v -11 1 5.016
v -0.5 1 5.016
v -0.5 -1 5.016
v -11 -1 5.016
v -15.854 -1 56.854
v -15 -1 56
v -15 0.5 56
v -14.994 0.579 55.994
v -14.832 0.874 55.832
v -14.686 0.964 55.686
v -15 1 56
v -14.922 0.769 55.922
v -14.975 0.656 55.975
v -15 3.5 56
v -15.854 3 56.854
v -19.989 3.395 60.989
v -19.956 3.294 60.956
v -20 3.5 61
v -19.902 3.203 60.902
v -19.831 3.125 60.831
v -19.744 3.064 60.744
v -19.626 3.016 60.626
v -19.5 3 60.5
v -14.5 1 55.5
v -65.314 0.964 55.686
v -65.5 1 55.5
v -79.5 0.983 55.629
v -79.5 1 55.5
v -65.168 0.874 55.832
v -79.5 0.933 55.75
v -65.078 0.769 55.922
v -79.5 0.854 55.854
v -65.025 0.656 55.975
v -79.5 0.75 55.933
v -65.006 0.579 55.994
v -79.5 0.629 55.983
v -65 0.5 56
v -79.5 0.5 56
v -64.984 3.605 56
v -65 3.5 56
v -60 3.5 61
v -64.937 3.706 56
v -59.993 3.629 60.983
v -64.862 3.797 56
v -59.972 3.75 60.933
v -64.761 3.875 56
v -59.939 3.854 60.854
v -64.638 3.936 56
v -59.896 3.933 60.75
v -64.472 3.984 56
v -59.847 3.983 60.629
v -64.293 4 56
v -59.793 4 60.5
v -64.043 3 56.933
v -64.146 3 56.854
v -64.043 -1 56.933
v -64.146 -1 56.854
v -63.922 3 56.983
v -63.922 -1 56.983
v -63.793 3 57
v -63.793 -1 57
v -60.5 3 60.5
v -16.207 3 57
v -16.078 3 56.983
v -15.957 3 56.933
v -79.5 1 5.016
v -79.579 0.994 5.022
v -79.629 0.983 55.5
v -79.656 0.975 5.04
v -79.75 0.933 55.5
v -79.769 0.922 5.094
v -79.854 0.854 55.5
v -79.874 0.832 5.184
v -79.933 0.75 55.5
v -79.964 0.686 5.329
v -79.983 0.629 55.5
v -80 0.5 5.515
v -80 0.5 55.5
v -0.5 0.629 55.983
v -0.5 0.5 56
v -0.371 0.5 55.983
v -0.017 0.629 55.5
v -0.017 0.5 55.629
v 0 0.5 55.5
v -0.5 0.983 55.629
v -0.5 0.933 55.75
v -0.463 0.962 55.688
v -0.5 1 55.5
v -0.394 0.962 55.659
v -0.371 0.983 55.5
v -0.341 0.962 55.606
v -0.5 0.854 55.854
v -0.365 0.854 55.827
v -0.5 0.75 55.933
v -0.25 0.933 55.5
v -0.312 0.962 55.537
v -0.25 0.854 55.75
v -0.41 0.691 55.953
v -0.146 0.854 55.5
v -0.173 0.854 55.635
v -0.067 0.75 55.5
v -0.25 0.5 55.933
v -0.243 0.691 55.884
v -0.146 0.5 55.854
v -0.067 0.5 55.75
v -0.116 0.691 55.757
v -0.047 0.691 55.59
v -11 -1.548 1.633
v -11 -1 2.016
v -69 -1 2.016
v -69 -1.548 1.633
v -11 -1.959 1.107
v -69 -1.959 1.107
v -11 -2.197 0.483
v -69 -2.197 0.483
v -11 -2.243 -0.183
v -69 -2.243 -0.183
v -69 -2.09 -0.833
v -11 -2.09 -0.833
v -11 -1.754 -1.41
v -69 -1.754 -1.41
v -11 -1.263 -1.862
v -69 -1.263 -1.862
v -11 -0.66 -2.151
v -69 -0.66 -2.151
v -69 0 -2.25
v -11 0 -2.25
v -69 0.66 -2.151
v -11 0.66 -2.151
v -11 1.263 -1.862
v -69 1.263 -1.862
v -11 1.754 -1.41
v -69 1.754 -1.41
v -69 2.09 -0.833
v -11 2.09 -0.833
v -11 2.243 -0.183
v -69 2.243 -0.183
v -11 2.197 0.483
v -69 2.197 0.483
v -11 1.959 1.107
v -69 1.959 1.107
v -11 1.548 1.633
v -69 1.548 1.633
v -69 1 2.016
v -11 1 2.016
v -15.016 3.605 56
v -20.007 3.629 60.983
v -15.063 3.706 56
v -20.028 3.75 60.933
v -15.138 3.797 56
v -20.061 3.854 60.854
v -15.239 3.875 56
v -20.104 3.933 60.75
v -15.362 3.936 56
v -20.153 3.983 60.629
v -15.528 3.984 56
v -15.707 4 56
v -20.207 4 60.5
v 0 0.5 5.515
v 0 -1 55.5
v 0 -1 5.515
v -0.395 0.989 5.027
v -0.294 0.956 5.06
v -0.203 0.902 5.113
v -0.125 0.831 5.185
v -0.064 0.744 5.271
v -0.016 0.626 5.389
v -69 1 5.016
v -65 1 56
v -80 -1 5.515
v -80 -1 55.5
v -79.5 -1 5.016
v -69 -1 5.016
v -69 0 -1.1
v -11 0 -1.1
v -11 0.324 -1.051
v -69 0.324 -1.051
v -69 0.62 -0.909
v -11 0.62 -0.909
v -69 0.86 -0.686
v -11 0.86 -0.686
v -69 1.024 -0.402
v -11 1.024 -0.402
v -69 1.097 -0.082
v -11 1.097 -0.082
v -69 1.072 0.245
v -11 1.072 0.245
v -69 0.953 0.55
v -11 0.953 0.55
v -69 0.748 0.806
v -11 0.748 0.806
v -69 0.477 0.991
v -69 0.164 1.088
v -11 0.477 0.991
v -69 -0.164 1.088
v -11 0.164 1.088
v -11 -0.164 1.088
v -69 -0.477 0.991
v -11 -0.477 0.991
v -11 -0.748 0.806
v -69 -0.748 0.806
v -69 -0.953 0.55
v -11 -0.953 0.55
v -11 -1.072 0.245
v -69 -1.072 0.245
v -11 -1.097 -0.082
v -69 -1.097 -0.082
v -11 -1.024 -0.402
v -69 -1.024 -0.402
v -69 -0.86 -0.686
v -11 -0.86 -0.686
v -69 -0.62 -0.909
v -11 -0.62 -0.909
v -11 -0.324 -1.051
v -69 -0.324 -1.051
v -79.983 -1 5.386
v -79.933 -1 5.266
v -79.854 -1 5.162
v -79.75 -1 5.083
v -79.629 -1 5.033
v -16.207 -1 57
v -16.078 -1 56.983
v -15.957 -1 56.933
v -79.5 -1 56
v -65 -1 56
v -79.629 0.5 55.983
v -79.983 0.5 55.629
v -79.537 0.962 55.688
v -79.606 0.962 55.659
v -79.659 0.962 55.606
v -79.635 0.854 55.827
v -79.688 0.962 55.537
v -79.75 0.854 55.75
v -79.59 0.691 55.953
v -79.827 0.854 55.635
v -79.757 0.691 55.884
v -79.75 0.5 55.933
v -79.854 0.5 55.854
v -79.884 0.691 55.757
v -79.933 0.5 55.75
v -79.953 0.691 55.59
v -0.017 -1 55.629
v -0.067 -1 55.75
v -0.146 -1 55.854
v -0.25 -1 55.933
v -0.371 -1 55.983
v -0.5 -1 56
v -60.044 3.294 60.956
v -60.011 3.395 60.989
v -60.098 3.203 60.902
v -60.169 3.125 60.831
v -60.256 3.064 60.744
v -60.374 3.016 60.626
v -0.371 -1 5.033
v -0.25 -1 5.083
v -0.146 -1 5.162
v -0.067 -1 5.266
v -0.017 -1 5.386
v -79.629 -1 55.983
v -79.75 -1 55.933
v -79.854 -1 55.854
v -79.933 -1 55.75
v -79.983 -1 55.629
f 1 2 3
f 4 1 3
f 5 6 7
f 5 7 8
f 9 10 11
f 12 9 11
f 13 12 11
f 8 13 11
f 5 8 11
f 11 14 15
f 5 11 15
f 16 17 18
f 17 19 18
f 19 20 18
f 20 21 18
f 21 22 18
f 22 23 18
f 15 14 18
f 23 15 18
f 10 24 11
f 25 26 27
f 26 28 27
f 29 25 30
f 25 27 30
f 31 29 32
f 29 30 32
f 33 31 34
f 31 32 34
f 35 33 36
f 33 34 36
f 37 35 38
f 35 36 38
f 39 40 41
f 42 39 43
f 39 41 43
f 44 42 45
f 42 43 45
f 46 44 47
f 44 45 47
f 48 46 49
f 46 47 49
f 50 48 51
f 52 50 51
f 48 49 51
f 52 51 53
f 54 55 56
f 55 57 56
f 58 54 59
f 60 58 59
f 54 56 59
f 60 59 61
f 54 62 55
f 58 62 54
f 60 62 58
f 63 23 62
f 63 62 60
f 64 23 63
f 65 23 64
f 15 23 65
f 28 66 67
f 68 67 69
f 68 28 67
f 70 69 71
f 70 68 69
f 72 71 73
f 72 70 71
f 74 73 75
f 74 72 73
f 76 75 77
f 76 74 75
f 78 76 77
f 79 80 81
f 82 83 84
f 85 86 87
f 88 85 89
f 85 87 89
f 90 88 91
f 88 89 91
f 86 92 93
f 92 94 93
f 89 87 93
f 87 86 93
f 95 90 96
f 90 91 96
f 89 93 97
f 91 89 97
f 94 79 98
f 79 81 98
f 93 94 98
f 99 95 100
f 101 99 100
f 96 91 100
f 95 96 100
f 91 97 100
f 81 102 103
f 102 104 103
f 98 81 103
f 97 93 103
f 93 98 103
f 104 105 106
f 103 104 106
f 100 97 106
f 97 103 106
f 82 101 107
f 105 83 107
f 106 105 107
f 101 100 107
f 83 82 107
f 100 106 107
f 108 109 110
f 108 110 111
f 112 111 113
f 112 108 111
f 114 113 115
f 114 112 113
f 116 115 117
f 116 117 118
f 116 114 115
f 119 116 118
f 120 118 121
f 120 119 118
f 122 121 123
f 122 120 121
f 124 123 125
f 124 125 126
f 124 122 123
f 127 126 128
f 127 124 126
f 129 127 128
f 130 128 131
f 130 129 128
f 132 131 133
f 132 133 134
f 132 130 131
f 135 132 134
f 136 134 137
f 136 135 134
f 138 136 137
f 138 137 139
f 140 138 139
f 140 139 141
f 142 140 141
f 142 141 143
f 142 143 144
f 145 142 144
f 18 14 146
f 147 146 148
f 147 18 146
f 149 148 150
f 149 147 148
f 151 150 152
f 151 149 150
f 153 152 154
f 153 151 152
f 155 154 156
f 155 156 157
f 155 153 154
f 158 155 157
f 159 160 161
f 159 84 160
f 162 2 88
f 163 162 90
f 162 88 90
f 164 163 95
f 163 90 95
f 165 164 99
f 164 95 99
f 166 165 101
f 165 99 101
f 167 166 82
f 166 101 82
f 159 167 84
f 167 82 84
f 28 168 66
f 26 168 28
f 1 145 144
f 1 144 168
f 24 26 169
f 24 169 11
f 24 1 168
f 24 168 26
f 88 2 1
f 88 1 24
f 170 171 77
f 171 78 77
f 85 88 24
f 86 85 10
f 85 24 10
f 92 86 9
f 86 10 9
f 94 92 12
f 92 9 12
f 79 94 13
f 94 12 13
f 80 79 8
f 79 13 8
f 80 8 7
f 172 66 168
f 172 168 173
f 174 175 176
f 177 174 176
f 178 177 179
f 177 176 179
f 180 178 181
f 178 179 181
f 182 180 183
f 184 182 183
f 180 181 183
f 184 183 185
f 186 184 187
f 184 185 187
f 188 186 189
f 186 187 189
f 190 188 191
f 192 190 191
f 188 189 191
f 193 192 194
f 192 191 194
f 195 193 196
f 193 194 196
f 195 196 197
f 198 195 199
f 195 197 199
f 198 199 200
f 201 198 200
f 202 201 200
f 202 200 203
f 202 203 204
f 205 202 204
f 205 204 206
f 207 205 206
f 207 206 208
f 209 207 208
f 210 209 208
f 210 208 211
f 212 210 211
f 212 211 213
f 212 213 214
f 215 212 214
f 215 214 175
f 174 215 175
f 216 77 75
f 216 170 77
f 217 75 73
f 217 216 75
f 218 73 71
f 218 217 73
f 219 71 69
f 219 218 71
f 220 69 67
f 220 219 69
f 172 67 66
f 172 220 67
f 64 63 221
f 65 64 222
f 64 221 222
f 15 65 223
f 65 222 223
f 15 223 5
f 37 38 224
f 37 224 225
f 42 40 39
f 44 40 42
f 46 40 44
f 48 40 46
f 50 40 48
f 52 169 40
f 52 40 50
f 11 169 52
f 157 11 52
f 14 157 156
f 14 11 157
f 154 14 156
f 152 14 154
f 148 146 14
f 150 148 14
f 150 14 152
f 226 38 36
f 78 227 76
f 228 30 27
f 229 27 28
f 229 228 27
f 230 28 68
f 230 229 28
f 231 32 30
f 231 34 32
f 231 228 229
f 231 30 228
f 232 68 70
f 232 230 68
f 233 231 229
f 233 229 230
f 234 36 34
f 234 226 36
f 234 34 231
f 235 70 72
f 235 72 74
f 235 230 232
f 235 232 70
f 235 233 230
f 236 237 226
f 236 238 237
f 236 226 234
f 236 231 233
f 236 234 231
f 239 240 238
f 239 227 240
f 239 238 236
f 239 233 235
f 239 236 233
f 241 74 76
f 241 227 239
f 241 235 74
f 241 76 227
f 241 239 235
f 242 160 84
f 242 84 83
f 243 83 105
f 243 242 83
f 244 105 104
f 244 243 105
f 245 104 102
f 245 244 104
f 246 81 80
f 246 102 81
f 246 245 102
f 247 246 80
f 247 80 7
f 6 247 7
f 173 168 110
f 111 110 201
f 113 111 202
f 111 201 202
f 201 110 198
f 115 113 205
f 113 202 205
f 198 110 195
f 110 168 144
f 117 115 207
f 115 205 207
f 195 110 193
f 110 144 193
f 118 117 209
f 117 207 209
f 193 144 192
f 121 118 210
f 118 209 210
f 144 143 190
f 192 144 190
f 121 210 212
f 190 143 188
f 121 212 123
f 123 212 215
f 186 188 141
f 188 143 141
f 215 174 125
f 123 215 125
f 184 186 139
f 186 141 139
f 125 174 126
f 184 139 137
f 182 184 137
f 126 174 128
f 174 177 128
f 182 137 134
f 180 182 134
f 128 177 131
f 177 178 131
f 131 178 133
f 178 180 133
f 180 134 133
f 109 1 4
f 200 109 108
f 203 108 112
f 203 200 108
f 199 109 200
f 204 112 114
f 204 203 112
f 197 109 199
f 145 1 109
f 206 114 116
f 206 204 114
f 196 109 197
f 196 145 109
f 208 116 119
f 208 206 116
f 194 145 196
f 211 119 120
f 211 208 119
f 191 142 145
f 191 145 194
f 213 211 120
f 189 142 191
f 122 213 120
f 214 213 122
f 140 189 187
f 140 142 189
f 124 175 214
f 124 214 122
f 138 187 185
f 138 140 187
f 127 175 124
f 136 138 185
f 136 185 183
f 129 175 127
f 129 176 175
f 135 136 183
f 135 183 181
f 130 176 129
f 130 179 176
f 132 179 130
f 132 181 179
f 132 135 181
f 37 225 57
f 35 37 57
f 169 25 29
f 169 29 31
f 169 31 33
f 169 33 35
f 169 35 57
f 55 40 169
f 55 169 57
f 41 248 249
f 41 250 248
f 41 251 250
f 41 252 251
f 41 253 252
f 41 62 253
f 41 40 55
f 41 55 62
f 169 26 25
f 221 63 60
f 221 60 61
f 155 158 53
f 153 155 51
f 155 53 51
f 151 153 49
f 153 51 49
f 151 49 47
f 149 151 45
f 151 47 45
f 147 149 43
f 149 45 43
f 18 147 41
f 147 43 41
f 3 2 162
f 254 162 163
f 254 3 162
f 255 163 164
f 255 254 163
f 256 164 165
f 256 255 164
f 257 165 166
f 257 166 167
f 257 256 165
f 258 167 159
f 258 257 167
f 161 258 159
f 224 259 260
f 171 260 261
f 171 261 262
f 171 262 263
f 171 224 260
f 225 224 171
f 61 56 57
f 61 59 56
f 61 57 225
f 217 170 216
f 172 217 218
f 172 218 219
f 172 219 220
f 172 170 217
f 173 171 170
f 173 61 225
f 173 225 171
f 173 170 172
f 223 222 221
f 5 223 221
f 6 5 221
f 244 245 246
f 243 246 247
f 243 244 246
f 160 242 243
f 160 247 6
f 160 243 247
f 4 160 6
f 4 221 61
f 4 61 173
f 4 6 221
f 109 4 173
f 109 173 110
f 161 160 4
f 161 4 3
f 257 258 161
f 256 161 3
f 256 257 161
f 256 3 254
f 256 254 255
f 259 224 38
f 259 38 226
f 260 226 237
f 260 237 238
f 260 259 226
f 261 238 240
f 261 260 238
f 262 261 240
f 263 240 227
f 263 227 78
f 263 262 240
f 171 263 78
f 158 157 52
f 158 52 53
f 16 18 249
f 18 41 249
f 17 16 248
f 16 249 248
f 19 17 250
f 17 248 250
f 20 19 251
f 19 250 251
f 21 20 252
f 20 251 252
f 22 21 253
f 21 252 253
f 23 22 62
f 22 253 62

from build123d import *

# Parameters (mm, degrees)
SKETCH2_R           = 1.1
BOSS_EXTRUDE1_DEPTH = 80
CUT_EXTRUDE1_START  = 40
CUT_EXTRUDE1_DEPTH  = 11
CUT_EXTRUDE2_DEPTH  = 101.797135376
FILLET1_R           = 0.5


with BuildPart() as part:
    # Sketch2 → Boss-Extrude1 (new body)
    with BuildSketch(Plane(origin=(0, 0, 0), x_dir=(0, 0, -1), z_dir=(1, 0, 0))):
        with BuildLine():
            ThreePointArc((-2.015564437, -1), (2.25, 0), (-2.015564437, 1))
            Line((-2.015564437, 1), (-56, 1))
            Line((-56, 1), (-56, 4))
            Line((-56, 4), (-61, 4))
            Line((-61, 4), (-61, 3))
            Line((-61, 3), (-57, 3))
            Line((-57, 3), (-57, 1))
            Line((-57, 1), (-57, -1))
            Line((-57, -1), (-2.015564437, -1))
        make_face()
        Circle(SKETCH2_R, mode=Mode.SUBTRACT)
    extrude(amount=-BOSS_EXTRUDE1_DEPTH)

    # Sketch5 → Cut-Extrude1 (cut)
    with BuildSketch(Plane(origin=(-40, 0, 0), x_dir=(0, 0, -1), z_dir=(1, 0, 0)).offset(CUT_EXTRUDE1_START)):
        with BuildLine():
            Line((-2.015564437, 1), (-5.015564437, 1))
            Line((-5.015564437, 1), (-5.015564437, -1))
            Line((-5.015564437, -1), (-2.015564437, -1))
            ThreePointArc((-2.015564437, -1), (2.25, 0), (-2.015564437, 1))
        make_face()
    cut_extrude1 = extrude(amount=-CUT_EXTRUDE1_DEPTH, mode=Mode.SUBTRACT)

    # Mirror1: Cut-Extrude1 across plane
    add(cut_extrude1.mirror(Plane(origin=(-40, 0, 0), x_dir=(0, 0, 1), z_dir=(1, 0, 0))), mode=Mode.SUBTRACT)

    # Sketch6 → Cut-Extrude2 (cut, through all)
    with BuildSketch(Plane(origin=(0, 4, 0), x_dir=(1, 0, 0), z_dir=(0, 1, 0))):
        Polygon((-65, -56), (-60, -61), (-80, -61), (-80, -56), align=None)
        Polygon((-15, -56), (-20, -61), (0, -61), (0, -56), align=None)
    extrude(amount=-CUT_EXTRUDE2_DEPTH, mode=Mode.SUBTRACT)

    # Fillet1
    fillet1_edges = [part.edges().sort_by_distance(p)[0] for p in [
        (-17.5, 4, 58.5),
        (-62.5, 4, 58.5),
        (-40, 4, 61),
        (0, 0, 5.015564437),
        (0, 0, 56),
        (-80, 0, 5.015564437),
        (-80, 0, 56),
        (-40, 3, 61),
        (-16, 1, 57),
        (-64, 1, 57),
        (-72.5, 1, 56),
        (-7.5, 1, 56),
        (0, 1, 30.507782219),
        (-80, 1, 30.507782219),
    ]]
    fillet(fillet1_edges, radius=FILLET1_R - 0.0001)  # a hair under: the kernel refuses the full size


solid = part.part
